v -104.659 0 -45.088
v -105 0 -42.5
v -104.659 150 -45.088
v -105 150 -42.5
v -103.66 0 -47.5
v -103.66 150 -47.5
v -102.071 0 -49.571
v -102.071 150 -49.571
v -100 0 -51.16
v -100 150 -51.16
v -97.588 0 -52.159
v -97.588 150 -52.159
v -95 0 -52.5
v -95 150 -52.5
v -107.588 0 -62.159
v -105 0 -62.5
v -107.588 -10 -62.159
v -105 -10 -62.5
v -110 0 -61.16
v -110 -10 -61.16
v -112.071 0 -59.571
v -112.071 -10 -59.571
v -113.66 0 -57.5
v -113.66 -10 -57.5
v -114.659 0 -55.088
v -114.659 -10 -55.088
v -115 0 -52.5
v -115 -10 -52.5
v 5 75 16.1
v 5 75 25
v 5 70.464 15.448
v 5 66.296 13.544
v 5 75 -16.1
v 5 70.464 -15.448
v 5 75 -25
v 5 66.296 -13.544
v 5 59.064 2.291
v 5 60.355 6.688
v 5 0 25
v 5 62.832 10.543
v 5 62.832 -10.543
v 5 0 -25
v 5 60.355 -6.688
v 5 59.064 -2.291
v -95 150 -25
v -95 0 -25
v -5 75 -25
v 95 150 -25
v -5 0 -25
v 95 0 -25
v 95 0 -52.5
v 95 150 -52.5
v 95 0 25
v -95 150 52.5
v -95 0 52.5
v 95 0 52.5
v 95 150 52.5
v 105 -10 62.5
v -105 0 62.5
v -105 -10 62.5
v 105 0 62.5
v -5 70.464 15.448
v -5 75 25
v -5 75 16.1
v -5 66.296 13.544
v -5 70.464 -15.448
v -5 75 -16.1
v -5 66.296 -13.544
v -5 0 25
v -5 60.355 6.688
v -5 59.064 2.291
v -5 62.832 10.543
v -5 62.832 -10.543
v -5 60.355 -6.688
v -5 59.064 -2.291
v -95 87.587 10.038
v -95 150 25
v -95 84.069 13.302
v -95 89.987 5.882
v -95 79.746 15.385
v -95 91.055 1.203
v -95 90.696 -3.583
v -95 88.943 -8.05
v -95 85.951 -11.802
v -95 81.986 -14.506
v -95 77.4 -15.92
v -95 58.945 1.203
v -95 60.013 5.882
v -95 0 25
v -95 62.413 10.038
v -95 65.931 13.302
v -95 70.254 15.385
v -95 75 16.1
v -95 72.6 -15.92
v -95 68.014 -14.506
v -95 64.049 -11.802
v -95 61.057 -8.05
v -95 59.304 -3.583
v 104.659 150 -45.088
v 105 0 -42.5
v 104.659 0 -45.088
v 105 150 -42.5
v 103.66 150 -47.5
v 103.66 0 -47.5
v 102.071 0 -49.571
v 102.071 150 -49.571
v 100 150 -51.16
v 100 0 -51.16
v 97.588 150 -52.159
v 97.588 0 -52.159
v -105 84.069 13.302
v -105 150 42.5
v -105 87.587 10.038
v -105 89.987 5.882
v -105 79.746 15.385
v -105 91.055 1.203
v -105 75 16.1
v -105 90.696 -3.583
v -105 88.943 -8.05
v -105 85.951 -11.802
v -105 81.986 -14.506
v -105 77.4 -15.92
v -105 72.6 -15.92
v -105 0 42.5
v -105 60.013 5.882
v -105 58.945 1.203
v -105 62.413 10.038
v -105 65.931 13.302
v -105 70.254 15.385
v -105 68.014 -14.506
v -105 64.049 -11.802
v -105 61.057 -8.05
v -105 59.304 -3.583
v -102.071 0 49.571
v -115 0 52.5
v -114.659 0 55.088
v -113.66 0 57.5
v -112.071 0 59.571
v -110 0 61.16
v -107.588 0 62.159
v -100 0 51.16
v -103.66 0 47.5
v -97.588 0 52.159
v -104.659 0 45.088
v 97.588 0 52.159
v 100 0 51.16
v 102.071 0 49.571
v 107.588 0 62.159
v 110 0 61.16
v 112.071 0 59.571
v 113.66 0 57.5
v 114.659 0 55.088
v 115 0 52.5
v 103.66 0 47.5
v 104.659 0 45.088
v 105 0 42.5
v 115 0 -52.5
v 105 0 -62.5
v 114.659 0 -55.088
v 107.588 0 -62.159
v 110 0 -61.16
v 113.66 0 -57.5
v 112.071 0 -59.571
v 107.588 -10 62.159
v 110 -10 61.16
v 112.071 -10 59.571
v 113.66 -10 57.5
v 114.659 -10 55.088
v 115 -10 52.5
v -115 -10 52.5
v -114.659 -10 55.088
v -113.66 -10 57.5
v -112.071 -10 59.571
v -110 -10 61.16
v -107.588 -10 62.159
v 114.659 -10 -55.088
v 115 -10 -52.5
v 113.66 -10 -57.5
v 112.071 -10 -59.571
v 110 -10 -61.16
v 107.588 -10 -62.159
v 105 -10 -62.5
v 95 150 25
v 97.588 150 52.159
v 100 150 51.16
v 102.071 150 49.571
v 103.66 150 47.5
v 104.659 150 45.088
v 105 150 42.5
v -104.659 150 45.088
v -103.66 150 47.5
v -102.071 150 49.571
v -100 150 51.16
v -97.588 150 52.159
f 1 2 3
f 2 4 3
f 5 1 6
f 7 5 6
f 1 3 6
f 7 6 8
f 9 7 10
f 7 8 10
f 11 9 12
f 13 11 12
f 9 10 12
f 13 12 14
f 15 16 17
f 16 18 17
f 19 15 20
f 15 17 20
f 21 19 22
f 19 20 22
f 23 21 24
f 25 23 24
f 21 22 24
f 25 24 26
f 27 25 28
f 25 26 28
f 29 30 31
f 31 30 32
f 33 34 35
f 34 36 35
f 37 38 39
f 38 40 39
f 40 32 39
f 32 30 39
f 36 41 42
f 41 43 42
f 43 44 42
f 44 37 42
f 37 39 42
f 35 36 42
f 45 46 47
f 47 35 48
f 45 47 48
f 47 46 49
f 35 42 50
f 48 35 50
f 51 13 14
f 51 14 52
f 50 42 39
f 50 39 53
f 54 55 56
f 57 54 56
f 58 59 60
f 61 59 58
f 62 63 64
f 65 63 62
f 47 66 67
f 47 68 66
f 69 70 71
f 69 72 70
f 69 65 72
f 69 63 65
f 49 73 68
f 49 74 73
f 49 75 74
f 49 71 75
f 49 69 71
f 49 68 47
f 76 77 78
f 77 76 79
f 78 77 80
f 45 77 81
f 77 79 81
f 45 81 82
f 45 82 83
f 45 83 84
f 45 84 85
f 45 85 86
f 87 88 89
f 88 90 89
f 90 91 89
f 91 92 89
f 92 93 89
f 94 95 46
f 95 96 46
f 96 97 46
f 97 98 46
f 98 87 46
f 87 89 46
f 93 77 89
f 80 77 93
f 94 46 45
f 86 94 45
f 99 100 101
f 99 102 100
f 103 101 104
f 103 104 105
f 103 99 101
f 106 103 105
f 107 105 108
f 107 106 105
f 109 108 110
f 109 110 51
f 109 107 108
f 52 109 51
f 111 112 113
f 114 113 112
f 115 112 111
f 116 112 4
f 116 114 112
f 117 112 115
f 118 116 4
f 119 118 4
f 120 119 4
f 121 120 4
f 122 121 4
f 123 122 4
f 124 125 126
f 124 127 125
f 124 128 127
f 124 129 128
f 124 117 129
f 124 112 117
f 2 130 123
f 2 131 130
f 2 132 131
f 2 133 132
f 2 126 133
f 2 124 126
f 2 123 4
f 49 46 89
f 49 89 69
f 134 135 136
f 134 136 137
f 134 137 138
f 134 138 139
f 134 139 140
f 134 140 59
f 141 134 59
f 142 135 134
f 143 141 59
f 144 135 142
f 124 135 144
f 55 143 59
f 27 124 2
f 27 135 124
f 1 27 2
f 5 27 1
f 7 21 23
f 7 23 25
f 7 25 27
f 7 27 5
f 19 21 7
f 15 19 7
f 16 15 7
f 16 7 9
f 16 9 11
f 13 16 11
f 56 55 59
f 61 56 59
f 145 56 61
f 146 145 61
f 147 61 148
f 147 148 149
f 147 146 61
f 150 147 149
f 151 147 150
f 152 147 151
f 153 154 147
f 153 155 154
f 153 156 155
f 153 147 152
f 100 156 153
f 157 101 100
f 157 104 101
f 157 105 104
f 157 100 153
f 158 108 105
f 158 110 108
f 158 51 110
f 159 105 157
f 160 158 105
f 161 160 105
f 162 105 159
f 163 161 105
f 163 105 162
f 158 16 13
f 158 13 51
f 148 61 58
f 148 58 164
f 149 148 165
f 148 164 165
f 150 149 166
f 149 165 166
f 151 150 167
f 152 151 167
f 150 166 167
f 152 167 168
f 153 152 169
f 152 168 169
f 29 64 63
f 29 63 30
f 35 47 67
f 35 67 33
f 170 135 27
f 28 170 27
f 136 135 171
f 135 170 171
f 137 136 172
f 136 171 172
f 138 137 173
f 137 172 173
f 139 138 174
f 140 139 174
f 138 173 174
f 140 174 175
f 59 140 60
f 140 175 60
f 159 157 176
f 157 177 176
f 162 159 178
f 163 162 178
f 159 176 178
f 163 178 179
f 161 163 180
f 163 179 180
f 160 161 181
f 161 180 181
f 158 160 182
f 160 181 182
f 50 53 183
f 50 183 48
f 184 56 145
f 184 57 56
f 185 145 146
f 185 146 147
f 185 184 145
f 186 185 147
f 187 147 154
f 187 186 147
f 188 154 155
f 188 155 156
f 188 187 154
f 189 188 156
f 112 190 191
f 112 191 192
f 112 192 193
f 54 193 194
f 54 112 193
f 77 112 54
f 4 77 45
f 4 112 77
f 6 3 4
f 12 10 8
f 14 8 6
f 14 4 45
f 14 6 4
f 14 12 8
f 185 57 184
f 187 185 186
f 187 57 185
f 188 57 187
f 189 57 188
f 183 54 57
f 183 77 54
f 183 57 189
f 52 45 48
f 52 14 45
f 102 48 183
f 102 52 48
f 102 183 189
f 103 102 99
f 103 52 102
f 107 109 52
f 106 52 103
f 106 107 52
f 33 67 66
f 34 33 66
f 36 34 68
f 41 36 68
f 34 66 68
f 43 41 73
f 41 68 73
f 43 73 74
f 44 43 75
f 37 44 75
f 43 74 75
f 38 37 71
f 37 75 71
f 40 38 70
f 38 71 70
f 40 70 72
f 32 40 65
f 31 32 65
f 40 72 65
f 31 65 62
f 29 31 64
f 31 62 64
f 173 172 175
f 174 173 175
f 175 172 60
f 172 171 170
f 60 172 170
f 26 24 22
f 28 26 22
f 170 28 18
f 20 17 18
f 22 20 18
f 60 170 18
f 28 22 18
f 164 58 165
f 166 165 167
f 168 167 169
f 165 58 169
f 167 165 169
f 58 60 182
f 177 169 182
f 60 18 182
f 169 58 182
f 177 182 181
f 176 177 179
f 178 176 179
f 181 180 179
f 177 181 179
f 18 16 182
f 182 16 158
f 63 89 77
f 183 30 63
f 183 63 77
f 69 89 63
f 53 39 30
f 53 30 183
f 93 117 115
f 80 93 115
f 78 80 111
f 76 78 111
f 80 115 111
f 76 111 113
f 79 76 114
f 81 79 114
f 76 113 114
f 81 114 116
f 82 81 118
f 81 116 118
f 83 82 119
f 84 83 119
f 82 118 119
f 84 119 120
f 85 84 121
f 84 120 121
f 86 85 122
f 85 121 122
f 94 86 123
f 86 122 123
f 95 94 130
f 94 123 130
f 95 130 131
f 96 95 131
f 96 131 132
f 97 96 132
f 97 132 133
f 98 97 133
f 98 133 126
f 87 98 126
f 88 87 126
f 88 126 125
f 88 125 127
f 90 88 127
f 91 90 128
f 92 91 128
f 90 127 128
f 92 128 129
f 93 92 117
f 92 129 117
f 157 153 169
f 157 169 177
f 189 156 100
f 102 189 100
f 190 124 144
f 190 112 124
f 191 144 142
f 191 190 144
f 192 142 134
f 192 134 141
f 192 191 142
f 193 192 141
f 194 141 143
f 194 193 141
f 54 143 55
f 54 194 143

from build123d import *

# Parameters (mm, degrees)
SKETCH2_W           = 210
SKETCH2_H           = 105
SKETCH2_W_2         = 190
SKETCH2_H_2         = 50
BOSS_EXTRUDE2_DEPTH = 150
FILLET1_R           = 10
FILLET2_R           = 10
FILLET3_R           = 10
FILLET4_R           = 10
SKETCH3_R           = 16.1
CUT_EXTRUDE1_DEPTH  = 10
SKETCH4_W           = 230
SKETCH4_H           = 125
BOSS_EXTRUDE3_DEPTH = 10
FILLET5_R           = 10
FILLET6_R           = 10
FILLET7_R           = 10
FILLET8_R           = 10
SKETCH7_W           = 10
SKETCH7_H           = 50
BOSS_EXTRUDE4_DEPTH = 75
SKETCH8_R           = 16.1
CUT_EXTRUDE2_DEPTH  = 10


with BuildPart() as part:
    # Sketch2 → Boss-Extrude2 (new body)
    with BuildSketch(Plane(origin=(0, 0, 0), x_dir=(1, 0, 0), z_dir=(0, 1, 0))):
        Rectangle(SKETCH2_W, SKETCH2_H)
        Rectangle(SKETCH2_W_2, SKETCH2_H_2, mode=Mode.SUBTRACT)
    extrude(amount=BOSS_EXTRUDE2_DEPTH)

    # Fillet1
    fillet1_edges = [part.edges().sort_by_distance(p)[0] for p in [
        (-105, 75, -52.5),
    ]]
    fillet(fillet1_edges, radius=FILLET1_R)

    # Fillet2
    fillet2_edges = [part.edges().sort_by_distance(p)[0] for p in [
        (-105, 75, 52.5),
    ]]
    fillet(fillet2_edges, radius=FILLET2_R)

    # Fillet3
    fillet3_edges = [part.edges().sort_by_distance(p)[0] for p in [
        (105, 75, 52.5),
    ]]
    fillet(fillet3_edges, radius=FILLET3_R)

    # Fillet4
    fillet4_edges = [part.edges().sort_by_distance(p)[0] for p in [
        (105, 75, -52.5),
    ]]
    fillet(fillet4_edges, radius=FILLET4_R)

    # Sketch3 → Cut-Extrude1 (cut)
    with BuildSketch(Plane.ZY.offset(105)):
        with Locations((0, 75)):
            Circle(SKETCH3_R)
    extrude(amount=-CUT_EXTRUDE1_DEPTH, mode=Mode.SUBTRACT)

    # Sketch4 → Boss-Extrude3 (add)
    with BuildSketch(Plane(origin=(0, 0, 0), x_dir=(1, 0, 0), z_dir=(0, 1, 0))):
        Rectangle(SKETCH4_W, SKETCH4_H)
    extrude(amount=-BOSS_EXTRUDE3_DEPTH)

    # Fillet5
    fillet5_edges = [part.edges().sort_by_distance(p)[0] for p in [
        (115, -5, 62.5),
    ]]
    fillet(fillet5_edges, radius=FILLET5_R)

    # Fillet6
    fillet6_edges = [part.edges().sort_by_distance(p)[0] for p in [
        (115, -5, -62.5),
    ]]
    fillet(fillet6_edges, radius=FILLET6_R)

    # Fillet7
    fillet7_edges = [part.edges().sort_by_distance(p)[0] for p in [
        (-115, -5, -62.5),
    ]]
    fillet(fillet7_edges, radius=FILLET7_R)

    # Fillet8
    fillet8_edges = [part.edges().sort_by_distance(p)[0] for p in [
        (-115, -5, 62.5),
    ]]
    fillet(fillet8_edges, radius=FILLET8_R)

    # Sketch7 → Boss-Extrude4 (add)
    with BuildSketch(Plane(origin=(0, 0, 0), x_dir=(1, 0, 0), z_dir=(0, 1, 0))):
        Rectangle(SKETCH7_W, SKETCH7_H)
    extrude(amount=BOSS_EXTRUDE4_DEPTH)

    # Sketch8 → Cut-Extrude2 (cut)
    with BuildSketch(Plane.ZY.offset(5)):
        with Locations((0, 75)):
            Circle(SKETCH8_R)
    extrude(amount=-CUT_EXTRUDE2_DEPTH, mode=Mode.SUBTRACT)


solid = part.part
